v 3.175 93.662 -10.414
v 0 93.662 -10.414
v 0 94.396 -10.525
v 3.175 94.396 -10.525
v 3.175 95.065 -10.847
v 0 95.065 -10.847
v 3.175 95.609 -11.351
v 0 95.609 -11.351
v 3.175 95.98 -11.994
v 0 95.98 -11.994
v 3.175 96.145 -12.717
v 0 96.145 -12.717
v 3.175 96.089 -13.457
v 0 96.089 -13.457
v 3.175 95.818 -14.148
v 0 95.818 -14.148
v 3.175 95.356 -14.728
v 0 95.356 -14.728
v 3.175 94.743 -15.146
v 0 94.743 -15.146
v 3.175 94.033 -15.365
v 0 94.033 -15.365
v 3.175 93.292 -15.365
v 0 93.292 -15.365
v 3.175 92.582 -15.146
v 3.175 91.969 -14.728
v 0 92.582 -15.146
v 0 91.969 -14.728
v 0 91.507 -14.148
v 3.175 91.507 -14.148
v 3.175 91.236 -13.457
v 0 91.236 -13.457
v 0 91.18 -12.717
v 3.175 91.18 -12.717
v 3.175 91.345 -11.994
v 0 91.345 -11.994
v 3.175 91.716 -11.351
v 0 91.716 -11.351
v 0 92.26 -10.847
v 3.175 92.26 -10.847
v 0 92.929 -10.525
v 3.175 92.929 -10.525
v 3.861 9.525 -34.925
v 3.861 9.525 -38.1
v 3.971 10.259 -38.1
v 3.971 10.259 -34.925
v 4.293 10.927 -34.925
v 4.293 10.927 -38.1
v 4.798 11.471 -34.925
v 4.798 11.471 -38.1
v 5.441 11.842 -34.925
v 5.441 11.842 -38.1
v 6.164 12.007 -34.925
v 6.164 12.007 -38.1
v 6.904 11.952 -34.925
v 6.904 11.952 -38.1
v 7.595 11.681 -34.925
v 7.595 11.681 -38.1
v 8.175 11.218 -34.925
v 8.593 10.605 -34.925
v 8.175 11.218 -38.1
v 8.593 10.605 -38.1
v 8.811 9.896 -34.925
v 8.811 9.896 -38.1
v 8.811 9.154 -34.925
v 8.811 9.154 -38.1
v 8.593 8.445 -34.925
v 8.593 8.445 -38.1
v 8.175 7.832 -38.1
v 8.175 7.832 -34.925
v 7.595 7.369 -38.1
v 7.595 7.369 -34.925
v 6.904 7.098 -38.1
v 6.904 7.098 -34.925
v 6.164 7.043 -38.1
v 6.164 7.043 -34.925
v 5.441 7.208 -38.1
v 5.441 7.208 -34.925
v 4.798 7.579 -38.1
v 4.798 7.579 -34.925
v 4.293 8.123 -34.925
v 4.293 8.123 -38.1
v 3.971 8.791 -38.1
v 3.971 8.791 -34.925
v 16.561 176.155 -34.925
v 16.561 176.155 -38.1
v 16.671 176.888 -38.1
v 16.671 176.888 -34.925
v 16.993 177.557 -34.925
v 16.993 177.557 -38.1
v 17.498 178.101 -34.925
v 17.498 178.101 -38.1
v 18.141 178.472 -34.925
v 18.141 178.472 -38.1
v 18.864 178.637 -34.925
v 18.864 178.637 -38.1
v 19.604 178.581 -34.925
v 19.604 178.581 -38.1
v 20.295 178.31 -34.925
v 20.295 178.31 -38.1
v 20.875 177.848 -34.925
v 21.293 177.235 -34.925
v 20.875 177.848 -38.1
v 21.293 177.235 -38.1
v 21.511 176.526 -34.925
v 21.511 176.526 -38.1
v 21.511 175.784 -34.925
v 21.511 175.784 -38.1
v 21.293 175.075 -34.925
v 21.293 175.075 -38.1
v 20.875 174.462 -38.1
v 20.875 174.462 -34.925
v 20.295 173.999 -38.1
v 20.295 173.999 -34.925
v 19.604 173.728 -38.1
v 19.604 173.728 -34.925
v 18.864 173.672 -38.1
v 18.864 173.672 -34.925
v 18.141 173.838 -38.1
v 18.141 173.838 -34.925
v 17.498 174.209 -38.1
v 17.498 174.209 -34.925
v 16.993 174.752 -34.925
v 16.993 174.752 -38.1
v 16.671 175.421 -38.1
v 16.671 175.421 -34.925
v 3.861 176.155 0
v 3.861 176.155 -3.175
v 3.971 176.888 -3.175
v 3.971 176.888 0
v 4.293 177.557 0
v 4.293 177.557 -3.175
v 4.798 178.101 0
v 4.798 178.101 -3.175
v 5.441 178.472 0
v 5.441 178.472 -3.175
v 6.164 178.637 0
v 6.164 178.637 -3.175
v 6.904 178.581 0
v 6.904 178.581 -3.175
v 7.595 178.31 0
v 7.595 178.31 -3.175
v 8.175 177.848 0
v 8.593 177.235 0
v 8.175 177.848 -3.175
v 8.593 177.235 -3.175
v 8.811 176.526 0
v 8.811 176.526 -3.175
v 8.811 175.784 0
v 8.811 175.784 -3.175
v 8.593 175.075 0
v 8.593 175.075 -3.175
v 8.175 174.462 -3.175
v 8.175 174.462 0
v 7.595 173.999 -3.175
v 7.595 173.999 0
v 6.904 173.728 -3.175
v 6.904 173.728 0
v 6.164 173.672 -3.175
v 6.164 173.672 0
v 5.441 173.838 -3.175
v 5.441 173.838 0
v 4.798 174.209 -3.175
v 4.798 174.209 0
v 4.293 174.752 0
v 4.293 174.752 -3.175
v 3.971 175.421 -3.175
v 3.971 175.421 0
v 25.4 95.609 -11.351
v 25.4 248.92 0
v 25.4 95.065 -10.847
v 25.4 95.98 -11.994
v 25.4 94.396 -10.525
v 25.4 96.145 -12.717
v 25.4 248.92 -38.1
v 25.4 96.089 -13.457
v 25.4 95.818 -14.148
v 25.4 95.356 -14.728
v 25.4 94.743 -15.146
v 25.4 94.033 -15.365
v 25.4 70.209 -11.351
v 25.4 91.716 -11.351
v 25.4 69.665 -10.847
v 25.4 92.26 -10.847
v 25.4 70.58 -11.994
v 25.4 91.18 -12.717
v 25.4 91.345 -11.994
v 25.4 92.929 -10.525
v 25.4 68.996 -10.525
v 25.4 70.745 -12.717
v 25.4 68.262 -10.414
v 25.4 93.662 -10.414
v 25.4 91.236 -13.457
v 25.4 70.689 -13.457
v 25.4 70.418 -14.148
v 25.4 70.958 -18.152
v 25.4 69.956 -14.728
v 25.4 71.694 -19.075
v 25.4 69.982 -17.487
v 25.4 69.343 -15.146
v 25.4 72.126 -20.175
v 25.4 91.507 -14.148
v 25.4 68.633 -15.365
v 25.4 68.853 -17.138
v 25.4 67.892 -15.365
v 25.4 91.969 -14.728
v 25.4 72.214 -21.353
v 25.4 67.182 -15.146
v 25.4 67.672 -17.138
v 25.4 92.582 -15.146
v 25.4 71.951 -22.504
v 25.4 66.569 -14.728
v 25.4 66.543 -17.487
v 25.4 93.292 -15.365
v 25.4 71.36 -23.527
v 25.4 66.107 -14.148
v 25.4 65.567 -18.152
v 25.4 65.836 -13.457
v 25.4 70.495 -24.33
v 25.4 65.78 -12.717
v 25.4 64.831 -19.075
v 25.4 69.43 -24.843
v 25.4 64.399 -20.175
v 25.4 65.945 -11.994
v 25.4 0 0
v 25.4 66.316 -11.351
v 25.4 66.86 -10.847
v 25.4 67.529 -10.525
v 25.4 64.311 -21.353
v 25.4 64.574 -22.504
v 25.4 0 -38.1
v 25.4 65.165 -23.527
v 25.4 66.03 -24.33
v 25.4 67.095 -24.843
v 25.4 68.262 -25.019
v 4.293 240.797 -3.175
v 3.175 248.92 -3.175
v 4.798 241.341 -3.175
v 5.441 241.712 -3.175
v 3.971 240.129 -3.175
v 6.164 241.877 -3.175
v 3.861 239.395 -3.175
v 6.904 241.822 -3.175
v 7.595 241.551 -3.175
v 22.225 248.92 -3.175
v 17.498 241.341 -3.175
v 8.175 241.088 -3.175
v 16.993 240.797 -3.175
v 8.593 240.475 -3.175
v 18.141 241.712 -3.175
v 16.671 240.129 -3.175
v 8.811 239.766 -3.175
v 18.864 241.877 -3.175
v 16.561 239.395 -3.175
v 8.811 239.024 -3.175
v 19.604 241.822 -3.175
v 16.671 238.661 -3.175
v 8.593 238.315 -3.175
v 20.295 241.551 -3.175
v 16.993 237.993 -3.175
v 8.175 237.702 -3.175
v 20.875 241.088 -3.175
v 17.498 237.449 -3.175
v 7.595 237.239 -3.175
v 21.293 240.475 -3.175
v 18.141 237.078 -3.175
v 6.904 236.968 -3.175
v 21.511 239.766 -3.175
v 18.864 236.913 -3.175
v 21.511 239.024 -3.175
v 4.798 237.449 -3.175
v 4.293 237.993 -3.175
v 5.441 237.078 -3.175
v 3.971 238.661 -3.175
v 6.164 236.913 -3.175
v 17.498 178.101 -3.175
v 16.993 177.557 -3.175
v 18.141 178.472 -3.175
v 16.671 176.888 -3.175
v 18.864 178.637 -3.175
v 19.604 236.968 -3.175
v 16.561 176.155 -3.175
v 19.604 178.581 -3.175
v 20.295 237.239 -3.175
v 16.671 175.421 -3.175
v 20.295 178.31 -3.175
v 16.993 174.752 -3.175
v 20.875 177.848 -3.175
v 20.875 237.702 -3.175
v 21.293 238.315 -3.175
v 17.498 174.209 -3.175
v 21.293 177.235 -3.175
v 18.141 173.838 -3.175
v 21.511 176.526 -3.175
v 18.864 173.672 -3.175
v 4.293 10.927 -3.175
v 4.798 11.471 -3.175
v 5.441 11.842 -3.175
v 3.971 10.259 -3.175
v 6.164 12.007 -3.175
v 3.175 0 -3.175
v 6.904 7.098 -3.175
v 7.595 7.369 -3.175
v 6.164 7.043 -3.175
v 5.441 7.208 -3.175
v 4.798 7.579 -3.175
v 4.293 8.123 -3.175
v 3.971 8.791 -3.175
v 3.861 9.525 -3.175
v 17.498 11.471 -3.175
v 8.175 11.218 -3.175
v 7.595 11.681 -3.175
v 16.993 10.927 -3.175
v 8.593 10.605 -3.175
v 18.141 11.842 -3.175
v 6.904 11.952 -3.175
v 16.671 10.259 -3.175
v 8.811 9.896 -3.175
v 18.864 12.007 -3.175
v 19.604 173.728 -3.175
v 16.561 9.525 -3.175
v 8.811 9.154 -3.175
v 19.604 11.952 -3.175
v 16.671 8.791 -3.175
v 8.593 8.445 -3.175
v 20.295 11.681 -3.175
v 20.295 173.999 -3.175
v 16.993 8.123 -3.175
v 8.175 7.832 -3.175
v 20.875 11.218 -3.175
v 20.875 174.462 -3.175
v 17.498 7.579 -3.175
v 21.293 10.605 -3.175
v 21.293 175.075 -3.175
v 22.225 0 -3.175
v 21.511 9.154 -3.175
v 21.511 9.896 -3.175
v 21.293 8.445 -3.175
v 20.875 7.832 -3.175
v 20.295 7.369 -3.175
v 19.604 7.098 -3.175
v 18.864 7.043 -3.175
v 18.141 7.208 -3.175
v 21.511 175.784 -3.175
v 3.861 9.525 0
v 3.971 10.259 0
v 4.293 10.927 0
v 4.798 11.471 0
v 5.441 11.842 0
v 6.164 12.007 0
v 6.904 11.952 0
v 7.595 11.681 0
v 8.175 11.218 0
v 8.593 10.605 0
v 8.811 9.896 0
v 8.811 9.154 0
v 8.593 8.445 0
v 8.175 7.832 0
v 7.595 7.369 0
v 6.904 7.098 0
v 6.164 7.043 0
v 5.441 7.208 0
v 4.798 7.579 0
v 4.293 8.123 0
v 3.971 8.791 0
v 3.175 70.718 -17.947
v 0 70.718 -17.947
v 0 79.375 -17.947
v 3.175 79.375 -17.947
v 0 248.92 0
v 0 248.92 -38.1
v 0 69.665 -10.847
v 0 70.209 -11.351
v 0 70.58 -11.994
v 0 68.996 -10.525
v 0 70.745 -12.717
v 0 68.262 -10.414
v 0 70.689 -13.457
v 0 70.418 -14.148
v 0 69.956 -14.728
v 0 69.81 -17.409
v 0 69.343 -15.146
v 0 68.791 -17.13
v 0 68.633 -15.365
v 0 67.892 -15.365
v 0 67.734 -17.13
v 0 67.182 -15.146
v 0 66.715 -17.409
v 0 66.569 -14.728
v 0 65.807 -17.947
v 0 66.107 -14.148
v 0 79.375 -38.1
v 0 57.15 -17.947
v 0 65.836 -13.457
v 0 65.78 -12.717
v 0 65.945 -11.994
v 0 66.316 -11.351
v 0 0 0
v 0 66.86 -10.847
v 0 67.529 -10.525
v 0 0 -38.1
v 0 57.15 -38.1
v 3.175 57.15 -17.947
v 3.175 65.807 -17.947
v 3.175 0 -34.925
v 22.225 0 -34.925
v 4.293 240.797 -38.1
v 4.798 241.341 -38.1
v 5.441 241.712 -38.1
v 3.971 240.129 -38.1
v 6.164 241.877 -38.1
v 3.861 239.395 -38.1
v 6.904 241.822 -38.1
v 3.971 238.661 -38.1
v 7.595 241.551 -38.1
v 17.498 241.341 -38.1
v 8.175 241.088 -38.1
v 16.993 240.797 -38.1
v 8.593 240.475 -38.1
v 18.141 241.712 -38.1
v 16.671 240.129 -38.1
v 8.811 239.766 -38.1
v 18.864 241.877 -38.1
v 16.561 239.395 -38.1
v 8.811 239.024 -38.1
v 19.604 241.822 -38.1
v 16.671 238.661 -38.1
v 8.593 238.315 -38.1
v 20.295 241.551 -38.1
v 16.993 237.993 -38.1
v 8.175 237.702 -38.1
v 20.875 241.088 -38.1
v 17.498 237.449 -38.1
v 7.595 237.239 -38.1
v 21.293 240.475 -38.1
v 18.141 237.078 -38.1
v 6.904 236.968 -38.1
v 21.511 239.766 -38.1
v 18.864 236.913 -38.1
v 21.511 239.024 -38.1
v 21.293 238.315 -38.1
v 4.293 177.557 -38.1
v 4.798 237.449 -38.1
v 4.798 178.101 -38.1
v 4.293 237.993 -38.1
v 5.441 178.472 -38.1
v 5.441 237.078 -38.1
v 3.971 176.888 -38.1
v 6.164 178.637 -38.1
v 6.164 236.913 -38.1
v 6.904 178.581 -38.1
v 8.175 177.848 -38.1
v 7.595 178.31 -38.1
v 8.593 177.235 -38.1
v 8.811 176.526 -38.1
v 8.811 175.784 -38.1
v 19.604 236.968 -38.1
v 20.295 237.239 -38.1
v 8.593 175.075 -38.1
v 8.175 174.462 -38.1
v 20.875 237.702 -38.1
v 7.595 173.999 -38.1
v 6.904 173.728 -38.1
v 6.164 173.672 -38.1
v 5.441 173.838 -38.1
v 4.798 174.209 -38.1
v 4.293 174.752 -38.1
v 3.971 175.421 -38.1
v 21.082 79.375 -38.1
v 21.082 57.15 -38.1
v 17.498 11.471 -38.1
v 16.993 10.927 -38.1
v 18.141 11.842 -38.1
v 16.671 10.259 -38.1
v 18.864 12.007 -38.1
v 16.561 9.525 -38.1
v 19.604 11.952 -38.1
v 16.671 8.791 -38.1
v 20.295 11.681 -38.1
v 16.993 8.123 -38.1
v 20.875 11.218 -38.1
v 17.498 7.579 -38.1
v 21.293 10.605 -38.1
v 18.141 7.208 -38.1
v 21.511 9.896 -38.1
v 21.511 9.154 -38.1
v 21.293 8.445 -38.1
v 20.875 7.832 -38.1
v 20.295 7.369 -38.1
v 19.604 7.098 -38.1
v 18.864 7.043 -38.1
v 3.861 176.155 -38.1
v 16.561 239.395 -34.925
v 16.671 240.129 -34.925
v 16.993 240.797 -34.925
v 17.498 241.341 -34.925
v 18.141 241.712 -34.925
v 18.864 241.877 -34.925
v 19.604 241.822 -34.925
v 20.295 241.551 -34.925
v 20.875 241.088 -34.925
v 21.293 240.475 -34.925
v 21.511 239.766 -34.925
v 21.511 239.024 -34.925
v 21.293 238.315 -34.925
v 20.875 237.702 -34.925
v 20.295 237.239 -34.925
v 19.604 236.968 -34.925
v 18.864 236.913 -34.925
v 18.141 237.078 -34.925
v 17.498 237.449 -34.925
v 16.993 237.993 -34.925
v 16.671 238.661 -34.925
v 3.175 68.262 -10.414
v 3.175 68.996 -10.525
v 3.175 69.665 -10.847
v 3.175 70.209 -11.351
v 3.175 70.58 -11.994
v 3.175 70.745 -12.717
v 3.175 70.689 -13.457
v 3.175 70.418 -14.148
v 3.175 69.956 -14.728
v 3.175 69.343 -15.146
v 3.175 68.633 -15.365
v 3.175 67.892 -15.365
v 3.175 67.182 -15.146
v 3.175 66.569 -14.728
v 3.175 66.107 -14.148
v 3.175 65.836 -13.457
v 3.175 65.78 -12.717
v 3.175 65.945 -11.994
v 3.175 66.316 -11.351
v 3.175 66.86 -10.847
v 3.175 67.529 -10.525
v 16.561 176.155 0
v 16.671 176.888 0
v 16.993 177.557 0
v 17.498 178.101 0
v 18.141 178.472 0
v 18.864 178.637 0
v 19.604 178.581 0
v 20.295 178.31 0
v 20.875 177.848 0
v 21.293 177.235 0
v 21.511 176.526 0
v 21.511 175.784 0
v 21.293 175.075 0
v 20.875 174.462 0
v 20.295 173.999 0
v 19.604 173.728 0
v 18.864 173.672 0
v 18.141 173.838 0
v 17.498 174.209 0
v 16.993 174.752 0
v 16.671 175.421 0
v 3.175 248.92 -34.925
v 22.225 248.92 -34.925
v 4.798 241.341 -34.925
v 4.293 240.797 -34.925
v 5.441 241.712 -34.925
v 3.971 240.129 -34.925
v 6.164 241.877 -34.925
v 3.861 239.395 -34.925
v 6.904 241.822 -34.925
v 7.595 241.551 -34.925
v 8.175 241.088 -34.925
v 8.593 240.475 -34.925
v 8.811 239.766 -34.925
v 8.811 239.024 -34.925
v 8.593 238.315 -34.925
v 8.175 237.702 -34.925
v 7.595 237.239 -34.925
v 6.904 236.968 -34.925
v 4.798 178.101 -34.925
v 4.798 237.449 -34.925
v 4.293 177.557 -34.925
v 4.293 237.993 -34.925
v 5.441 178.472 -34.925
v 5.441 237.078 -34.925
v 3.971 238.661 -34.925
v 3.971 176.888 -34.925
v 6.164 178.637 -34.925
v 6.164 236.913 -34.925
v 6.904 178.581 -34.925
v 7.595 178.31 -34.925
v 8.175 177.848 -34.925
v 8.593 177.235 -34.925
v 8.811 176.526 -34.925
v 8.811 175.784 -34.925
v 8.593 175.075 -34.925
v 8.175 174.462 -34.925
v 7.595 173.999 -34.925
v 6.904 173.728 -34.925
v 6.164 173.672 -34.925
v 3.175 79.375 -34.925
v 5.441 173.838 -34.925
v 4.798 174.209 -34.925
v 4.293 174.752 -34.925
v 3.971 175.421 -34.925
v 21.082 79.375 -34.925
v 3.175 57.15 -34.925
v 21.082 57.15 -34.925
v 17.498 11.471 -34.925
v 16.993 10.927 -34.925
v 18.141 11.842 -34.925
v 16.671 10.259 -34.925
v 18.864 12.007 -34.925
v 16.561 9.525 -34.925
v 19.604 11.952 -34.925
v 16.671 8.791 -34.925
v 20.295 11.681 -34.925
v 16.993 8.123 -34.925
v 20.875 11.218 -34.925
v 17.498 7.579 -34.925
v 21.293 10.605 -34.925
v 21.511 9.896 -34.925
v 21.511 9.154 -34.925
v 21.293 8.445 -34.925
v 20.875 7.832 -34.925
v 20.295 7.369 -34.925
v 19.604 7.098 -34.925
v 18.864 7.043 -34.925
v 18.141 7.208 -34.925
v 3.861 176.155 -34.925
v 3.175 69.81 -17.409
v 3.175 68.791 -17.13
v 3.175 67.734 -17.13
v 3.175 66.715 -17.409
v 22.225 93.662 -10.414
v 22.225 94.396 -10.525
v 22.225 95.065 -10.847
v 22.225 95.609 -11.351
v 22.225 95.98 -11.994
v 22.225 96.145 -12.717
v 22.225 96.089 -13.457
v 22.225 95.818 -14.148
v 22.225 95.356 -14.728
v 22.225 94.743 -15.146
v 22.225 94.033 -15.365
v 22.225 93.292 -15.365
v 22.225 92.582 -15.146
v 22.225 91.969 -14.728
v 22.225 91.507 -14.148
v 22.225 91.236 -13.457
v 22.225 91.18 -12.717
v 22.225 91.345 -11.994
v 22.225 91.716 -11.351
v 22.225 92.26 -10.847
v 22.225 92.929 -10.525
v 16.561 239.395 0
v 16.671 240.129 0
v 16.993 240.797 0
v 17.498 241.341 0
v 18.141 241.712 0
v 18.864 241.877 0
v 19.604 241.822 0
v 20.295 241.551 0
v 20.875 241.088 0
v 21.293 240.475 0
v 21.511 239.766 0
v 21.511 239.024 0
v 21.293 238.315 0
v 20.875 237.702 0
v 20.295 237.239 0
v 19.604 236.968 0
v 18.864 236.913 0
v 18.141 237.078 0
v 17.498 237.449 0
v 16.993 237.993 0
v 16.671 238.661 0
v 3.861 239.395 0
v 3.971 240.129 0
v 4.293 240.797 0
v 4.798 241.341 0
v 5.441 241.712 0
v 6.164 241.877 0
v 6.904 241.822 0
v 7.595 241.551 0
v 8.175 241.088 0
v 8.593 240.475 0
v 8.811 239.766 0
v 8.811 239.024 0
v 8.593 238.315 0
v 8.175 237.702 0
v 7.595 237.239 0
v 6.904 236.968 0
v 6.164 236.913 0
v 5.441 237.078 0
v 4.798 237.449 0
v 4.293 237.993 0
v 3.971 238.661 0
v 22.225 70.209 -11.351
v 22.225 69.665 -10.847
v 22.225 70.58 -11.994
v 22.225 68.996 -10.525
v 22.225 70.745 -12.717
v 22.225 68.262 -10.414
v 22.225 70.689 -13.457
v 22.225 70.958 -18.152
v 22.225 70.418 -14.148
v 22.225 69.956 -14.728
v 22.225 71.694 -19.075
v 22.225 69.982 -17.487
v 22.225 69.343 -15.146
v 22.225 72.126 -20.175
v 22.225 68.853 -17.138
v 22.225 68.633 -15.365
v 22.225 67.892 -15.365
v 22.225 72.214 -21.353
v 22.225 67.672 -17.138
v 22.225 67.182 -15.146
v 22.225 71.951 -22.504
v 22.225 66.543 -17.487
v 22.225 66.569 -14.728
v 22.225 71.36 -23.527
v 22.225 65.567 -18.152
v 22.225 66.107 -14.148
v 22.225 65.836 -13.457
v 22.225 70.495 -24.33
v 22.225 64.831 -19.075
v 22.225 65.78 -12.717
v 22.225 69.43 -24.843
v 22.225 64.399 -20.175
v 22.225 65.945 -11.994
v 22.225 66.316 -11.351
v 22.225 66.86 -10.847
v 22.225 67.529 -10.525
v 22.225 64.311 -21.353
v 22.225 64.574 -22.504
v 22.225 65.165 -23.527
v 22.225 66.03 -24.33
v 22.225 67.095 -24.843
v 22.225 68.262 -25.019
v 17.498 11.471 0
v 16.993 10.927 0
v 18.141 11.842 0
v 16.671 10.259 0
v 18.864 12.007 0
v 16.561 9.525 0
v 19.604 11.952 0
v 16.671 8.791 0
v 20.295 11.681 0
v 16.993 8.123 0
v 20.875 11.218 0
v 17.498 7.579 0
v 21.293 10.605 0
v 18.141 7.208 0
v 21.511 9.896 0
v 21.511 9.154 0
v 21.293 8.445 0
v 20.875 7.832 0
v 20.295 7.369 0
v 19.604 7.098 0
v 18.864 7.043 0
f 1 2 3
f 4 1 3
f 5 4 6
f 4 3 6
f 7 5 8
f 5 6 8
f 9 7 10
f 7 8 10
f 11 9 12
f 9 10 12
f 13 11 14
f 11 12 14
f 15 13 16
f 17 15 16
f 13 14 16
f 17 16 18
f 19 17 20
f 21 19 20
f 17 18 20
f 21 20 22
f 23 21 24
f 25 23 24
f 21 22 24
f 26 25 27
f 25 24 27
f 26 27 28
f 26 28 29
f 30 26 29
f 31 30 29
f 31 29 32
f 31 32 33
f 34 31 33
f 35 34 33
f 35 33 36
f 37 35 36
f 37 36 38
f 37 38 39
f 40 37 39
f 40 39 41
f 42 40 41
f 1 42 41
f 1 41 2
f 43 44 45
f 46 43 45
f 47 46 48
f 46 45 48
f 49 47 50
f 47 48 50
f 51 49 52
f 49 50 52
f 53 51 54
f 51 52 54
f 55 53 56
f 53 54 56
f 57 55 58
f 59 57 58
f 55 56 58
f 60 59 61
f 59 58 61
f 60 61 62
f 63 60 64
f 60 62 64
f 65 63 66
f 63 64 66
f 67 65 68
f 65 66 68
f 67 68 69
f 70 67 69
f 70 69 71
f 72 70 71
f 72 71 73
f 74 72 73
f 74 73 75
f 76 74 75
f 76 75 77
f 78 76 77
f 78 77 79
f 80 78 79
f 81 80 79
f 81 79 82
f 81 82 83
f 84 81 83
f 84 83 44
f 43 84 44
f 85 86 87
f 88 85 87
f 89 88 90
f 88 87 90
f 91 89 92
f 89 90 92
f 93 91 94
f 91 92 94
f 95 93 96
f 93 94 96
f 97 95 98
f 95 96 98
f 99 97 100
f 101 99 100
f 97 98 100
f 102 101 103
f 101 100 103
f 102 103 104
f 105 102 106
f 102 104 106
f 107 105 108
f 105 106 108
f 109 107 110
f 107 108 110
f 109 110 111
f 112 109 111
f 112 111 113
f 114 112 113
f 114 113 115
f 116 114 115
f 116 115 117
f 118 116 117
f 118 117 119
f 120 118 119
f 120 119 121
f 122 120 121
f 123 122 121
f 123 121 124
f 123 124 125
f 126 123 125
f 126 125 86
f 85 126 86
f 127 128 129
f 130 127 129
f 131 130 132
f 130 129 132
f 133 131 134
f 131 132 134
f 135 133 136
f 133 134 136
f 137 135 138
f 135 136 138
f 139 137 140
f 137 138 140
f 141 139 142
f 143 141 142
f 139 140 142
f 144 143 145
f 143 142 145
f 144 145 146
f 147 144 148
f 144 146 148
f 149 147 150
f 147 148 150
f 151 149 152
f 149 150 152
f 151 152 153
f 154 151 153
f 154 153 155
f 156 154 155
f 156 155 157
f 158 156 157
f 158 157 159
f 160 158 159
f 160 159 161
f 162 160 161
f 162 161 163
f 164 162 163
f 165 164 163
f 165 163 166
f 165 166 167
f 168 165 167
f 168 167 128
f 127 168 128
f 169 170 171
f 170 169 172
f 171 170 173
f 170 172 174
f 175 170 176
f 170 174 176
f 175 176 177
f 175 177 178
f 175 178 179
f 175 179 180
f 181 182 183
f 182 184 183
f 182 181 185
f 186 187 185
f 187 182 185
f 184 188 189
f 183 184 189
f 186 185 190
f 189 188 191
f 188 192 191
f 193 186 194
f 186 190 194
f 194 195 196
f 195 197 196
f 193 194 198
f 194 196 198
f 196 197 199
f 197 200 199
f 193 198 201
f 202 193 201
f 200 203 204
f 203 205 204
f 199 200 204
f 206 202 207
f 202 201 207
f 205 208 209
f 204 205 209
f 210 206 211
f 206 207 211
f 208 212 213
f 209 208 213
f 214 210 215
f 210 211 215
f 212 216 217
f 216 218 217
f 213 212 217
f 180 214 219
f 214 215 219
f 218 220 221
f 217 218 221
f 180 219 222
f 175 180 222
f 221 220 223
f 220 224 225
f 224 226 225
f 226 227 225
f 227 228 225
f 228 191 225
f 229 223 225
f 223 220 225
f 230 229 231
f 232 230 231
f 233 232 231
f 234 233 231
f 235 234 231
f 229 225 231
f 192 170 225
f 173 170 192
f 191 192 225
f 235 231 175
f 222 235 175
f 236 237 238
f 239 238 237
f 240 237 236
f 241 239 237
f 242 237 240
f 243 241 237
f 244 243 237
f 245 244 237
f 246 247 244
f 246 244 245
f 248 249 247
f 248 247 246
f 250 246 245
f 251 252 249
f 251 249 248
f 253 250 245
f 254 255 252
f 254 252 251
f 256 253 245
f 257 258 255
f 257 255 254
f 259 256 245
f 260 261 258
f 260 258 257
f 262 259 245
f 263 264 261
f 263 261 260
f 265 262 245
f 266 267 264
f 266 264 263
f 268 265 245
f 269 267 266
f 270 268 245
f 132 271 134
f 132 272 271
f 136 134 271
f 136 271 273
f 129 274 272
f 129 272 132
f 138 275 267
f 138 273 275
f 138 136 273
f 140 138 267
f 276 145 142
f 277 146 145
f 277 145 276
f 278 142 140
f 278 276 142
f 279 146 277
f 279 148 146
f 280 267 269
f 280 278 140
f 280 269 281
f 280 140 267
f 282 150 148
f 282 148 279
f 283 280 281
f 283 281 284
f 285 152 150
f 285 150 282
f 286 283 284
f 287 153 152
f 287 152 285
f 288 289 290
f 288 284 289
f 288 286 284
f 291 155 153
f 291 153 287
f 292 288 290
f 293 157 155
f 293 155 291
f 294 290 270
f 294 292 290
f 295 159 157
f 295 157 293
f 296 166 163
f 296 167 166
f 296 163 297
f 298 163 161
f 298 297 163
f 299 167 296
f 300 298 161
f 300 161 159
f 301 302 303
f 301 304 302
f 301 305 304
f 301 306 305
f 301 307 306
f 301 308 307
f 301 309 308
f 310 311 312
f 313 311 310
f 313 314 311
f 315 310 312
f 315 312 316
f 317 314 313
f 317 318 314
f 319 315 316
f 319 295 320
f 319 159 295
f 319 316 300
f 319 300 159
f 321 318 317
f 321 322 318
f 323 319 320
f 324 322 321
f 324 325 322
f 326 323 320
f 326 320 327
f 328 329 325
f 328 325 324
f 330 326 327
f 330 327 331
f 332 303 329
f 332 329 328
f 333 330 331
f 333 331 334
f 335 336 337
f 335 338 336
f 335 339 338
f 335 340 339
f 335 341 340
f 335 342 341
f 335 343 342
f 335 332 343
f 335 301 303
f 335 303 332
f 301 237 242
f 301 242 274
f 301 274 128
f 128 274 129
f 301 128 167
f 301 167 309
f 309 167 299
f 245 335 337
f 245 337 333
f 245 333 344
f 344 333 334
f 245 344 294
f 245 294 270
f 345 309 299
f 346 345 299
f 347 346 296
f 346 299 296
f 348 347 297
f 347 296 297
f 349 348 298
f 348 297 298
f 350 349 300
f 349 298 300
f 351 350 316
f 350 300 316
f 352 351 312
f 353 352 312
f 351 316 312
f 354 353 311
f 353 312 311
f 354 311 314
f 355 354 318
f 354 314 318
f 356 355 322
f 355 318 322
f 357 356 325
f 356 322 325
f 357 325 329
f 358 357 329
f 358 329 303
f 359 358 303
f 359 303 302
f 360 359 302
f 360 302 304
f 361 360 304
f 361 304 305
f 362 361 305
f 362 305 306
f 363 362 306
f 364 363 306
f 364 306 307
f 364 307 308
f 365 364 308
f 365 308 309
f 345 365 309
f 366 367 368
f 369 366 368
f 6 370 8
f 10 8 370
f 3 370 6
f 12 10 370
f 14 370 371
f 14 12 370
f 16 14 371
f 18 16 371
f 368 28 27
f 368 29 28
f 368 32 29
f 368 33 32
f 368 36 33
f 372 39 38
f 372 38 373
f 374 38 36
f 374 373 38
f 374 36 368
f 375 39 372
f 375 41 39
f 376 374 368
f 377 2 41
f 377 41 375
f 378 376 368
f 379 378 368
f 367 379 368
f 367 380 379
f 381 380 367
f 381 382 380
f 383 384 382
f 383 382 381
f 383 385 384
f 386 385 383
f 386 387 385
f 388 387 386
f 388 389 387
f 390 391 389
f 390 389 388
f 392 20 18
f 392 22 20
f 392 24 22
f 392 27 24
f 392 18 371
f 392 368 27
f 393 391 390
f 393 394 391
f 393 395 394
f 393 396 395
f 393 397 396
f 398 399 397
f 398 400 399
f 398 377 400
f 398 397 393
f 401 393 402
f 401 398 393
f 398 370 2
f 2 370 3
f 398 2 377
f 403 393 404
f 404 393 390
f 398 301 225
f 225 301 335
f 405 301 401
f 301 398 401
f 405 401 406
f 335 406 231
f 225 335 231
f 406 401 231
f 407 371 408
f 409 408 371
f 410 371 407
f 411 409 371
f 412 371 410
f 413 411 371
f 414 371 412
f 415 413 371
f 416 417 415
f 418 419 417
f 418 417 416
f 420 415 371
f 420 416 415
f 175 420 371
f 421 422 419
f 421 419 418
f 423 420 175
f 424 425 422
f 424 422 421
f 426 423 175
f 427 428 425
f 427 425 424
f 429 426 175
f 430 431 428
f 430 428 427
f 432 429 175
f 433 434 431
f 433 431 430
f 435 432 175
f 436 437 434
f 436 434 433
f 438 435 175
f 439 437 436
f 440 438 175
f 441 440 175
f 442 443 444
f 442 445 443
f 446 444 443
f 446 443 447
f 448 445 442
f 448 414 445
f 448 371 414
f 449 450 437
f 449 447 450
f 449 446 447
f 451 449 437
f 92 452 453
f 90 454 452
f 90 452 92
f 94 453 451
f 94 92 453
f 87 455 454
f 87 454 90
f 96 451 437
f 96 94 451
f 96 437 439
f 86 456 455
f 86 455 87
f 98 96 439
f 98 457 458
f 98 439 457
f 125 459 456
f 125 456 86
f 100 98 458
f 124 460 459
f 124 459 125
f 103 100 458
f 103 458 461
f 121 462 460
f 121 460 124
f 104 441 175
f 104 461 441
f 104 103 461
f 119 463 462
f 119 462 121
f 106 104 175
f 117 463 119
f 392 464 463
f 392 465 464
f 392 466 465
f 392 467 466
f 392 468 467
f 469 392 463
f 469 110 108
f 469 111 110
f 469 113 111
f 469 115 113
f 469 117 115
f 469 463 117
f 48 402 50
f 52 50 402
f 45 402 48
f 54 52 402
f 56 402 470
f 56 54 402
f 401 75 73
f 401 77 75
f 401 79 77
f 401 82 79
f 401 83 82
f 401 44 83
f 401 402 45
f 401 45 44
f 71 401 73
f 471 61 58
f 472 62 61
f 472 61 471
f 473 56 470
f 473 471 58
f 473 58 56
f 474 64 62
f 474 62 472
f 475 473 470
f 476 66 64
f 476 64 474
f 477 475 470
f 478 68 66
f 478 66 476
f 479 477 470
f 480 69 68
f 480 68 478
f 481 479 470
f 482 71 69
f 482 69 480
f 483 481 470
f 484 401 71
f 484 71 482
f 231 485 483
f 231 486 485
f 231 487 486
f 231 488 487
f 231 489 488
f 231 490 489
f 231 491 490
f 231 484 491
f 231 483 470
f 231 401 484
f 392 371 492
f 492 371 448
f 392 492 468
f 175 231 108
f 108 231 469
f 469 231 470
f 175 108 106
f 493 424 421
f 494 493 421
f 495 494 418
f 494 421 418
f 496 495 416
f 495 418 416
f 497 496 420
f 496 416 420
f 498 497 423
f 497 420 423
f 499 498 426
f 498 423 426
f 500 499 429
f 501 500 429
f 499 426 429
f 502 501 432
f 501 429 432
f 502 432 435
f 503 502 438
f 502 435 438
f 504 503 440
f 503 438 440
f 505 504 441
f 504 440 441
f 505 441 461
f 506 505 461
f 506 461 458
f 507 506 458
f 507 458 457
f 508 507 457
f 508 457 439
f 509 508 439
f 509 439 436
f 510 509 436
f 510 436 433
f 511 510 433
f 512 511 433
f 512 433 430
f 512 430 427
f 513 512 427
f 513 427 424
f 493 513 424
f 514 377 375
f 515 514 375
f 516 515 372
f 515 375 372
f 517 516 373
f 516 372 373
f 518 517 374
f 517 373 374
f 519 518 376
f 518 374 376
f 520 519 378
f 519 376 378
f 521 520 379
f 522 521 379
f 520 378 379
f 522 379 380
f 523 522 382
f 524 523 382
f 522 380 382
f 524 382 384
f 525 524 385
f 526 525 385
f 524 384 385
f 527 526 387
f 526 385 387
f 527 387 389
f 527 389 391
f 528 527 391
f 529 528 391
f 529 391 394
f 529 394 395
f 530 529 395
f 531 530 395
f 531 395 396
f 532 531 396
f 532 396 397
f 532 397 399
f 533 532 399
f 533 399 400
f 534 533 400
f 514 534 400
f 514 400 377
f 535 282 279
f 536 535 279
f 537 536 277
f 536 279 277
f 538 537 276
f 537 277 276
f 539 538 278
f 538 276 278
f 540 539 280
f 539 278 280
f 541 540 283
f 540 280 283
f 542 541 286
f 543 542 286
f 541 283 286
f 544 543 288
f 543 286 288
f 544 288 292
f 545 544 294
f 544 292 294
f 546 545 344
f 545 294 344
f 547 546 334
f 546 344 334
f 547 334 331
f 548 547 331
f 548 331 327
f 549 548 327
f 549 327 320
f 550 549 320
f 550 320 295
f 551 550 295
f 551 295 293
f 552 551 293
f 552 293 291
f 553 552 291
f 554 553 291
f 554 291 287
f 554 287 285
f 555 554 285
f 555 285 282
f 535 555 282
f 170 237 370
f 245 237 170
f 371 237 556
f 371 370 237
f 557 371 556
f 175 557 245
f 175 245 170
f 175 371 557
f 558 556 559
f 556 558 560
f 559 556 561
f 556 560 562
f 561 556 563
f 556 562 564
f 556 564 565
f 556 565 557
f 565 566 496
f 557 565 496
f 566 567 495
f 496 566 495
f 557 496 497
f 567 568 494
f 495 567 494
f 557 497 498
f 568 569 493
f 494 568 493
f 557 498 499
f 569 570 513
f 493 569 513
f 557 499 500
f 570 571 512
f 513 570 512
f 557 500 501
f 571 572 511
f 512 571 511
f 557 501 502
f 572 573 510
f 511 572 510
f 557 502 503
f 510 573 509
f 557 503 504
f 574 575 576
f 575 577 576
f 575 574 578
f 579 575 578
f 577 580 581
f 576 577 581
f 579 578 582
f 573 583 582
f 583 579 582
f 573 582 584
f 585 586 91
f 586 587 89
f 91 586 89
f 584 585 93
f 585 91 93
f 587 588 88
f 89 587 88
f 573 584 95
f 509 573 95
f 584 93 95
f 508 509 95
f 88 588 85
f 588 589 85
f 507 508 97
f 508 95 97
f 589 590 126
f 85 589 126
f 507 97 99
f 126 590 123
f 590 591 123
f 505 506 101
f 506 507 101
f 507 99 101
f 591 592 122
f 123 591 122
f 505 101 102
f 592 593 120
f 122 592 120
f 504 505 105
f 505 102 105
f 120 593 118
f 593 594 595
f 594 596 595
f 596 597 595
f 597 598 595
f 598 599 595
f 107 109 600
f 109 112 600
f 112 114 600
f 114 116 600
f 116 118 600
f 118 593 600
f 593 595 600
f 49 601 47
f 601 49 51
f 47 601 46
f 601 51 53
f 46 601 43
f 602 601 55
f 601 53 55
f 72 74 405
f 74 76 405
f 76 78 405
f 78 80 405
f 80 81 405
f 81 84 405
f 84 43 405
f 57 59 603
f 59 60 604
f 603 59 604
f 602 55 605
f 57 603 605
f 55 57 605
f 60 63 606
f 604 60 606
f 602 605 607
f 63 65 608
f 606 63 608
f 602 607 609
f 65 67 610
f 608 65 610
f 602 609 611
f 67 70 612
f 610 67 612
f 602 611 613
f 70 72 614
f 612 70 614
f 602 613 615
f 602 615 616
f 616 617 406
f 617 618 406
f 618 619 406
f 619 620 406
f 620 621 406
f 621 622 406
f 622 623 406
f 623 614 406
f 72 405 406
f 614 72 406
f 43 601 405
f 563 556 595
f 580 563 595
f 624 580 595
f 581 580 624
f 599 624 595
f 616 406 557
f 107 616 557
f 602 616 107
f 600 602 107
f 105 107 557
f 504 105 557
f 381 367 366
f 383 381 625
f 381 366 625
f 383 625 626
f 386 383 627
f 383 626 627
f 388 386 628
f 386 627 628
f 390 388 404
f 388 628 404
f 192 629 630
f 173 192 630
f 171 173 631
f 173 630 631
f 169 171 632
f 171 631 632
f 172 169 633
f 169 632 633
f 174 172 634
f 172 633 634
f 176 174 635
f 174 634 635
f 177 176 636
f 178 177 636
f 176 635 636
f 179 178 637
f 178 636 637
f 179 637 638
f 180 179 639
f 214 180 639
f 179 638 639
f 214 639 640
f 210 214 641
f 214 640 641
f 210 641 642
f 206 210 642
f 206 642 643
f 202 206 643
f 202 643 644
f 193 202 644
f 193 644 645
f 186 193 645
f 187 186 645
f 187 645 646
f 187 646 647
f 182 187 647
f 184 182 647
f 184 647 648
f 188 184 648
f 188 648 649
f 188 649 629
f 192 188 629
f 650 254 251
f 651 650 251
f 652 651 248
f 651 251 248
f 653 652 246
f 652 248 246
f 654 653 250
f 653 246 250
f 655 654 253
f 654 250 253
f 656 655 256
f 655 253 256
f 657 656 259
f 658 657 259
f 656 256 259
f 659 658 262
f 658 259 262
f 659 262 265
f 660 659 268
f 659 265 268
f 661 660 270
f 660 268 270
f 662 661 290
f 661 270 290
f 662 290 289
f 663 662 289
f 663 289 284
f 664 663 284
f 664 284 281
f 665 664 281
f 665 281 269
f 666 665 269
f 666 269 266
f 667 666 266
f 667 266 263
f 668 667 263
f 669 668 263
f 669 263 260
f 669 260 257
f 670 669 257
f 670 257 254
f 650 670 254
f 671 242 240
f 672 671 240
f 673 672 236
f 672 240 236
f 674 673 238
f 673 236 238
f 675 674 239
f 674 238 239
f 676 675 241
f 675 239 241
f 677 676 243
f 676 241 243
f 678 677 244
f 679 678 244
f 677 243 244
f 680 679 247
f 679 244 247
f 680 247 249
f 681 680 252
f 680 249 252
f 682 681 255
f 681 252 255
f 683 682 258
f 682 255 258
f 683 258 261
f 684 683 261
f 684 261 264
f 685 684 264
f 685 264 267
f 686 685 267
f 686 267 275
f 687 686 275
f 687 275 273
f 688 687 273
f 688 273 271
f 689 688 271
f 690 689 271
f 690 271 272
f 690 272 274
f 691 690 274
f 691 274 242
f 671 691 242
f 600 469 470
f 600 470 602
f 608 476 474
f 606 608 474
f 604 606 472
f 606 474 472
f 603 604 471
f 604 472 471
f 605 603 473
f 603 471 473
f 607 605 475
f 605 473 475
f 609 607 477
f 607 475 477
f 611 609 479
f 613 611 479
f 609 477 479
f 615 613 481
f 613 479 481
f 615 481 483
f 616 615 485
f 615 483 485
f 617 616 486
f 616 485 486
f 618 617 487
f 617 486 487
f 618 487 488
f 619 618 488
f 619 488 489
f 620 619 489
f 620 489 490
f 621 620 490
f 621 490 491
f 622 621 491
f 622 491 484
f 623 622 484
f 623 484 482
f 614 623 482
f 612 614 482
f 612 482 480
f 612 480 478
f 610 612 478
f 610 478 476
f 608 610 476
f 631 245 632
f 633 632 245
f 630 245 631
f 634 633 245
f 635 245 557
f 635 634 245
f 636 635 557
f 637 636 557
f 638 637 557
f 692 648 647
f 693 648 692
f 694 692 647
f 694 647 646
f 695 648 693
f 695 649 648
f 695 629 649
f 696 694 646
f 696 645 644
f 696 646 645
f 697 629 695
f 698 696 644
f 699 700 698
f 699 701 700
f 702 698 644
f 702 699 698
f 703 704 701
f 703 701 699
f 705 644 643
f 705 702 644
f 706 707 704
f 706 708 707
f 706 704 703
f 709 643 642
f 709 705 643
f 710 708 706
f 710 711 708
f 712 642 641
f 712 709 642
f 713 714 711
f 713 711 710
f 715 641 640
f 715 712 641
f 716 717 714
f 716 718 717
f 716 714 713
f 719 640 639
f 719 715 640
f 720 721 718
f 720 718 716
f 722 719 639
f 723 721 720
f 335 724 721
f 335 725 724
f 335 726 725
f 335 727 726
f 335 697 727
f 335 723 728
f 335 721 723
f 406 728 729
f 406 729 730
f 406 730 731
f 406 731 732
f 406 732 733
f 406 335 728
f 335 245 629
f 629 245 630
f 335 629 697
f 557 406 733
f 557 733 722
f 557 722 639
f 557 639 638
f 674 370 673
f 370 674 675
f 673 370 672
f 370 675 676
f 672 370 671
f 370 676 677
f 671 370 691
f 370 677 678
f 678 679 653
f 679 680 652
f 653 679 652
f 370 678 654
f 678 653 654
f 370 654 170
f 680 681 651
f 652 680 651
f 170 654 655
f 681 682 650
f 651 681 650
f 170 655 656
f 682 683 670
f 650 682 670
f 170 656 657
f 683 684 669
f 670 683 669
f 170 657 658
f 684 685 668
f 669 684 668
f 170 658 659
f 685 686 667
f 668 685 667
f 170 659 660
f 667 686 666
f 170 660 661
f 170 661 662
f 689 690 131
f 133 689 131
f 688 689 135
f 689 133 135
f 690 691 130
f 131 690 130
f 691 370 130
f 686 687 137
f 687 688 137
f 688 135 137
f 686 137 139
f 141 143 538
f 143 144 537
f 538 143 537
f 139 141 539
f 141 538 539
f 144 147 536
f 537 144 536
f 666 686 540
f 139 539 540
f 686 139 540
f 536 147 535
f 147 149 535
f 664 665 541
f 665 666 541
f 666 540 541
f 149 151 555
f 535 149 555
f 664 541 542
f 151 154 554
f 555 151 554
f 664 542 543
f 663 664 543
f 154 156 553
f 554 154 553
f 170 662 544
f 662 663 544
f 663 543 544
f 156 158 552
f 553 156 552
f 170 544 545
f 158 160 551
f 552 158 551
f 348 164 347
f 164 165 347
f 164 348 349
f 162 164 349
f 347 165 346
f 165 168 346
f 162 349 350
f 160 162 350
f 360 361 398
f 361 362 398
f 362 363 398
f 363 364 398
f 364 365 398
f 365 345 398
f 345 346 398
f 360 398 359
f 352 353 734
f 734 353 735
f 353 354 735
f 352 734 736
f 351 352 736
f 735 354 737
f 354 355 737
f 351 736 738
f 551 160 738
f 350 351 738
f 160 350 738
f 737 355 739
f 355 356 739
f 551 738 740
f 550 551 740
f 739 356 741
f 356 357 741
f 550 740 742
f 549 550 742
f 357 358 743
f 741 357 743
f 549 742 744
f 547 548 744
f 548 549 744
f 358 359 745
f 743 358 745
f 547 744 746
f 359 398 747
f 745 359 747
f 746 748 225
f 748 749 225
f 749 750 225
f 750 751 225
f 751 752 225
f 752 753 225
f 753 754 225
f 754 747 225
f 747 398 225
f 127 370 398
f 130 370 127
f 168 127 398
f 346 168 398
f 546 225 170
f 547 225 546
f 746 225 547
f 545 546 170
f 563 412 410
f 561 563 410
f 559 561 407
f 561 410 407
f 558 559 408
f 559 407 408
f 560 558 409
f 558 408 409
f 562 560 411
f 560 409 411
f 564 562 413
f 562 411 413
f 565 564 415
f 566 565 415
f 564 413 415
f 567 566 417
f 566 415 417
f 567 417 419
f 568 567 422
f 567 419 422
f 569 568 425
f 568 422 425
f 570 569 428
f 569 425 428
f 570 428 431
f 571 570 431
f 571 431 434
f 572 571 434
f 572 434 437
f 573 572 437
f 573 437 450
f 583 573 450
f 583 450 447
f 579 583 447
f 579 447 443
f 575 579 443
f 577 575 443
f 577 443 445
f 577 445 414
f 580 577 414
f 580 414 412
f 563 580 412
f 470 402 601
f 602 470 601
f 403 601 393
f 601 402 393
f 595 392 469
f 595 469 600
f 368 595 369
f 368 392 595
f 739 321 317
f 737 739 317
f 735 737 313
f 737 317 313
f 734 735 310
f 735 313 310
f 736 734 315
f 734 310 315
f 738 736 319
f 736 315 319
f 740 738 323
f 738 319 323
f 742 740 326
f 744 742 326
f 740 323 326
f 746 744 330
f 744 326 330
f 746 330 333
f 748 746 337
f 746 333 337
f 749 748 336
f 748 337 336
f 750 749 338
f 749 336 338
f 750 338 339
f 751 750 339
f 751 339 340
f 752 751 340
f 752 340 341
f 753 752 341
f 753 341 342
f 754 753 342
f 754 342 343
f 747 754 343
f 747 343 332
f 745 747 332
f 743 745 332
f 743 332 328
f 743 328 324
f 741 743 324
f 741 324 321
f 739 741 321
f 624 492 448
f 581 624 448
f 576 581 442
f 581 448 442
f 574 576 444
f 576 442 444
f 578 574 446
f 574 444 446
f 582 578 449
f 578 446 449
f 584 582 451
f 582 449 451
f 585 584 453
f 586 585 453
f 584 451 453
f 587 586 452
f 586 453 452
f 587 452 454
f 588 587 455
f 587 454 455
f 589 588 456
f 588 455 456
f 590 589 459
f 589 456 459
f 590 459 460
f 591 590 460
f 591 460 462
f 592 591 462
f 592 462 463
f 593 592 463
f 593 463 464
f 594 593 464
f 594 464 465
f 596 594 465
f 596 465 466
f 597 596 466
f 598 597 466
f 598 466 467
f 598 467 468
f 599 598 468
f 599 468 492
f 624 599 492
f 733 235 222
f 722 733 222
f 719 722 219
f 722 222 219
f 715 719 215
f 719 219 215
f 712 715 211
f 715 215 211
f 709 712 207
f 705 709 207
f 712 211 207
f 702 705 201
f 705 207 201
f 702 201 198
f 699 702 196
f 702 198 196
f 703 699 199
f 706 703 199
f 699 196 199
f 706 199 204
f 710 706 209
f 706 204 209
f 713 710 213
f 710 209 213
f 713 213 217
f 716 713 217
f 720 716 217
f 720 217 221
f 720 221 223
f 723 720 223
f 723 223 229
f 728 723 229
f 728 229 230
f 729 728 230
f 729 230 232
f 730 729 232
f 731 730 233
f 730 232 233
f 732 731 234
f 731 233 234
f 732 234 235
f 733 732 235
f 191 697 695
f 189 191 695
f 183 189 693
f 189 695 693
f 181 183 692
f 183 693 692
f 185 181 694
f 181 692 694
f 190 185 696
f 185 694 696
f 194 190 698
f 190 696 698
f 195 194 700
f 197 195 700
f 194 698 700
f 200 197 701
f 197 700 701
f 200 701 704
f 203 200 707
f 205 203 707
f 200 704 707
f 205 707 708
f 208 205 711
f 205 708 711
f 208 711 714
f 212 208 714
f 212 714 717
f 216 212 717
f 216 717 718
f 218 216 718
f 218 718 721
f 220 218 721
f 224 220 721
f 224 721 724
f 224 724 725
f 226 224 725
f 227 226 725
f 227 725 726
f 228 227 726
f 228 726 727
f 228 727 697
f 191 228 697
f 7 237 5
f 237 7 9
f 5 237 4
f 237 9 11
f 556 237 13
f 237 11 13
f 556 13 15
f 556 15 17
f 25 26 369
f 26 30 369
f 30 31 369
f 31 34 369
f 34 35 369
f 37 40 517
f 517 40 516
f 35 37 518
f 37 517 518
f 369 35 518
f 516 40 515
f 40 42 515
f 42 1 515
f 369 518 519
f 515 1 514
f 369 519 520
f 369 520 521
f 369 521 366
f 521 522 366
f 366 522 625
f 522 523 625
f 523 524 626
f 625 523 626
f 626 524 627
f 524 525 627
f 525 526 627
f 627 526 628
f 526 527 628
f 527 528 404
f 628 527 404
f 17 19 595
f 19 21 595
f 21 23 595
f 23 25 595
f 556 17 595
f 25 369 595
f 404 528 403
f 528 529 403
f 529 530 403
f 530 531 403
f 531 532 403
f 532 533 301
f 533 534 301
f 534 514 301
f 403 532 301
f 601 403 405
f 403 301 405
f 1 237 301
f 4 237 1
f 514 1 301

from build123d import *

# Parameters (mm, degrees)
SKETCH1_W           = 25.4
SKETCH1_H           = 38.1
SKETCH1_W_2         = 19.05
SKETCH1_H_2         = 31.75
EXTRUDE_THIN1_DEPTH = 248.92
SKETCH5_W           = 47.1424
SKETCH5_H           = 22.225
CUT_EXTRUDE2_DEPTH  = 21.082
SKETCH7_R           = 2.4892
CUT_EXTRUDE4_DEPTH  = 26.4
SKETCH8_R           = 2.4892
CUT_EXTRUDE5_DEPTH  = 26.4
SKETCH10_R          = 3.9624
CUT_EXTRUDE7_DEPTH  = 3.175
SKETCH11_R          = 3.9624
CUT_EXTRUDE8_DEPTH  = 77.2
SKETCH13_R          = 2.4892
CUT_EXTRUDE9_DEPTH  = 39.1
SKETCH16_R          = 2.4892
CUT_EXTRUDE13_DEPTH = 39.1


with BuildPart() as part:
    # Sketch1 → Extrude-Thin1 (new body)
    with BuildSketch(Plane(origin=(0, 0, 0), x_dir=(1, 0, 0), z_dir=(0, 1, 0))):
        with Locations((12.7, 19.05)):
            Rectangle(SKETCH1_W, SKETCH1_H)
        with Locations((12.7, 19.05)):
            Rectangle(SKETCH1_W_2, SKETCH1_H_2, mode=Mode.SUBTRACT)
    extrude(amount=EXTRUDE_THIN1_DEPTH)

    # Sketch5 → Cut-Extrude2 (cut)
    with BuildSketch(Plane.ZY):
        with Locations((-41.518281917, 68.2625)):
            Rectangle(SKETCH5_W, SKETCH5_H)
    extrude(amount=-CUT_EXTRUDE2_DEPTH, mode=Mode.SUBTRACT)

    # Sketch7 → Cut-Extrude4 (cut, through all)
    with BuildSketch(Plane.ZY):
        with Locations((-12.9032, 93.6625)):
            Circle(SKETCH7_R)
    extrude(amount=-CUT_EXTRUDE4_DEPTH, mode=Mode.SUBTRACT)

    # Sketch8 → Cut-Extrude5 (cut, through all)
    with BuildSketch(Plane.ZY):
        with Locations((-12.9032, 68.2625)):
            Circle(SKETCH8_R)
    extrude(amount=-CUT_EXTRUDE5_DEPTH, mode=Mode.SUBTRACT)

    # Sketch10 → Cut-Extrude7 (cut)
    with BuildSketch(Plane(origin=(25.4, 0, 0), x_dir=(0, 0, -1), z_dir=(1, 0, 0))):
        with Locations((21.0566, 68.2625)):
            Circle(SKETCH10_R)
    extrude(amount=-CUT_EXTRUDE7_DEPTH, mode=Mode.SUBTRACT)

    # Sketch11 → Cut-Extrude8 (cut, through all)
    with BuildSketch(Plane(origin=(76.2, 0, 0), x_dir=(0, 0, -1), z_dir=(1, 0, 0))):
        with Locations((21.0566, 68.2625)):
            Circle(SKETCH11_R)
    extrude(amount=-CUT_EXTRUDE8_DEPTH, mode=Mode.SUBTRACT)

    # Sketch13 → Cut-Extrude9 (cut, through all)
    with BuildSketch(Plane(origin=(0, 0, -38.1), x_dir=(-1, 0, 0), z_dir=(0, 0, -1))):
        with Locations((-19.05, 9.525)):
            Circle(SKETCH13_R)
        with Locations((-6.35, 9.525)):
            Circle(SKETCH13_R)
        with Locations((-6.35, 239.395)):
            Circle(SKETCH13_R)
        with Locations((-19.05, 239.395)):
            Circle(SKETCH13_R)
    extrude(amount=-CUT_EXTRUDE9_DEPTH, mode=Mode.SUBTRACT)

    # Sketch16 → Cut-Extrude13 (cut, through all)
    with BuildSketch(Plane(origin=(0, 0, -38.1), x_dir=(-1, 0, 0), z_dir=(0, 0, -1))):
        with Locations((-19.05, 176.15465)):
            Circle(SKETCH16_R)
        with Locations((-6.35, 176.15465)):
            Circle(SKETCH16_R)
    extrude(amount=-CUT_EXTRUDE13_DEPTH, mode=Mode.SUBTRACT)


solid = part.part
